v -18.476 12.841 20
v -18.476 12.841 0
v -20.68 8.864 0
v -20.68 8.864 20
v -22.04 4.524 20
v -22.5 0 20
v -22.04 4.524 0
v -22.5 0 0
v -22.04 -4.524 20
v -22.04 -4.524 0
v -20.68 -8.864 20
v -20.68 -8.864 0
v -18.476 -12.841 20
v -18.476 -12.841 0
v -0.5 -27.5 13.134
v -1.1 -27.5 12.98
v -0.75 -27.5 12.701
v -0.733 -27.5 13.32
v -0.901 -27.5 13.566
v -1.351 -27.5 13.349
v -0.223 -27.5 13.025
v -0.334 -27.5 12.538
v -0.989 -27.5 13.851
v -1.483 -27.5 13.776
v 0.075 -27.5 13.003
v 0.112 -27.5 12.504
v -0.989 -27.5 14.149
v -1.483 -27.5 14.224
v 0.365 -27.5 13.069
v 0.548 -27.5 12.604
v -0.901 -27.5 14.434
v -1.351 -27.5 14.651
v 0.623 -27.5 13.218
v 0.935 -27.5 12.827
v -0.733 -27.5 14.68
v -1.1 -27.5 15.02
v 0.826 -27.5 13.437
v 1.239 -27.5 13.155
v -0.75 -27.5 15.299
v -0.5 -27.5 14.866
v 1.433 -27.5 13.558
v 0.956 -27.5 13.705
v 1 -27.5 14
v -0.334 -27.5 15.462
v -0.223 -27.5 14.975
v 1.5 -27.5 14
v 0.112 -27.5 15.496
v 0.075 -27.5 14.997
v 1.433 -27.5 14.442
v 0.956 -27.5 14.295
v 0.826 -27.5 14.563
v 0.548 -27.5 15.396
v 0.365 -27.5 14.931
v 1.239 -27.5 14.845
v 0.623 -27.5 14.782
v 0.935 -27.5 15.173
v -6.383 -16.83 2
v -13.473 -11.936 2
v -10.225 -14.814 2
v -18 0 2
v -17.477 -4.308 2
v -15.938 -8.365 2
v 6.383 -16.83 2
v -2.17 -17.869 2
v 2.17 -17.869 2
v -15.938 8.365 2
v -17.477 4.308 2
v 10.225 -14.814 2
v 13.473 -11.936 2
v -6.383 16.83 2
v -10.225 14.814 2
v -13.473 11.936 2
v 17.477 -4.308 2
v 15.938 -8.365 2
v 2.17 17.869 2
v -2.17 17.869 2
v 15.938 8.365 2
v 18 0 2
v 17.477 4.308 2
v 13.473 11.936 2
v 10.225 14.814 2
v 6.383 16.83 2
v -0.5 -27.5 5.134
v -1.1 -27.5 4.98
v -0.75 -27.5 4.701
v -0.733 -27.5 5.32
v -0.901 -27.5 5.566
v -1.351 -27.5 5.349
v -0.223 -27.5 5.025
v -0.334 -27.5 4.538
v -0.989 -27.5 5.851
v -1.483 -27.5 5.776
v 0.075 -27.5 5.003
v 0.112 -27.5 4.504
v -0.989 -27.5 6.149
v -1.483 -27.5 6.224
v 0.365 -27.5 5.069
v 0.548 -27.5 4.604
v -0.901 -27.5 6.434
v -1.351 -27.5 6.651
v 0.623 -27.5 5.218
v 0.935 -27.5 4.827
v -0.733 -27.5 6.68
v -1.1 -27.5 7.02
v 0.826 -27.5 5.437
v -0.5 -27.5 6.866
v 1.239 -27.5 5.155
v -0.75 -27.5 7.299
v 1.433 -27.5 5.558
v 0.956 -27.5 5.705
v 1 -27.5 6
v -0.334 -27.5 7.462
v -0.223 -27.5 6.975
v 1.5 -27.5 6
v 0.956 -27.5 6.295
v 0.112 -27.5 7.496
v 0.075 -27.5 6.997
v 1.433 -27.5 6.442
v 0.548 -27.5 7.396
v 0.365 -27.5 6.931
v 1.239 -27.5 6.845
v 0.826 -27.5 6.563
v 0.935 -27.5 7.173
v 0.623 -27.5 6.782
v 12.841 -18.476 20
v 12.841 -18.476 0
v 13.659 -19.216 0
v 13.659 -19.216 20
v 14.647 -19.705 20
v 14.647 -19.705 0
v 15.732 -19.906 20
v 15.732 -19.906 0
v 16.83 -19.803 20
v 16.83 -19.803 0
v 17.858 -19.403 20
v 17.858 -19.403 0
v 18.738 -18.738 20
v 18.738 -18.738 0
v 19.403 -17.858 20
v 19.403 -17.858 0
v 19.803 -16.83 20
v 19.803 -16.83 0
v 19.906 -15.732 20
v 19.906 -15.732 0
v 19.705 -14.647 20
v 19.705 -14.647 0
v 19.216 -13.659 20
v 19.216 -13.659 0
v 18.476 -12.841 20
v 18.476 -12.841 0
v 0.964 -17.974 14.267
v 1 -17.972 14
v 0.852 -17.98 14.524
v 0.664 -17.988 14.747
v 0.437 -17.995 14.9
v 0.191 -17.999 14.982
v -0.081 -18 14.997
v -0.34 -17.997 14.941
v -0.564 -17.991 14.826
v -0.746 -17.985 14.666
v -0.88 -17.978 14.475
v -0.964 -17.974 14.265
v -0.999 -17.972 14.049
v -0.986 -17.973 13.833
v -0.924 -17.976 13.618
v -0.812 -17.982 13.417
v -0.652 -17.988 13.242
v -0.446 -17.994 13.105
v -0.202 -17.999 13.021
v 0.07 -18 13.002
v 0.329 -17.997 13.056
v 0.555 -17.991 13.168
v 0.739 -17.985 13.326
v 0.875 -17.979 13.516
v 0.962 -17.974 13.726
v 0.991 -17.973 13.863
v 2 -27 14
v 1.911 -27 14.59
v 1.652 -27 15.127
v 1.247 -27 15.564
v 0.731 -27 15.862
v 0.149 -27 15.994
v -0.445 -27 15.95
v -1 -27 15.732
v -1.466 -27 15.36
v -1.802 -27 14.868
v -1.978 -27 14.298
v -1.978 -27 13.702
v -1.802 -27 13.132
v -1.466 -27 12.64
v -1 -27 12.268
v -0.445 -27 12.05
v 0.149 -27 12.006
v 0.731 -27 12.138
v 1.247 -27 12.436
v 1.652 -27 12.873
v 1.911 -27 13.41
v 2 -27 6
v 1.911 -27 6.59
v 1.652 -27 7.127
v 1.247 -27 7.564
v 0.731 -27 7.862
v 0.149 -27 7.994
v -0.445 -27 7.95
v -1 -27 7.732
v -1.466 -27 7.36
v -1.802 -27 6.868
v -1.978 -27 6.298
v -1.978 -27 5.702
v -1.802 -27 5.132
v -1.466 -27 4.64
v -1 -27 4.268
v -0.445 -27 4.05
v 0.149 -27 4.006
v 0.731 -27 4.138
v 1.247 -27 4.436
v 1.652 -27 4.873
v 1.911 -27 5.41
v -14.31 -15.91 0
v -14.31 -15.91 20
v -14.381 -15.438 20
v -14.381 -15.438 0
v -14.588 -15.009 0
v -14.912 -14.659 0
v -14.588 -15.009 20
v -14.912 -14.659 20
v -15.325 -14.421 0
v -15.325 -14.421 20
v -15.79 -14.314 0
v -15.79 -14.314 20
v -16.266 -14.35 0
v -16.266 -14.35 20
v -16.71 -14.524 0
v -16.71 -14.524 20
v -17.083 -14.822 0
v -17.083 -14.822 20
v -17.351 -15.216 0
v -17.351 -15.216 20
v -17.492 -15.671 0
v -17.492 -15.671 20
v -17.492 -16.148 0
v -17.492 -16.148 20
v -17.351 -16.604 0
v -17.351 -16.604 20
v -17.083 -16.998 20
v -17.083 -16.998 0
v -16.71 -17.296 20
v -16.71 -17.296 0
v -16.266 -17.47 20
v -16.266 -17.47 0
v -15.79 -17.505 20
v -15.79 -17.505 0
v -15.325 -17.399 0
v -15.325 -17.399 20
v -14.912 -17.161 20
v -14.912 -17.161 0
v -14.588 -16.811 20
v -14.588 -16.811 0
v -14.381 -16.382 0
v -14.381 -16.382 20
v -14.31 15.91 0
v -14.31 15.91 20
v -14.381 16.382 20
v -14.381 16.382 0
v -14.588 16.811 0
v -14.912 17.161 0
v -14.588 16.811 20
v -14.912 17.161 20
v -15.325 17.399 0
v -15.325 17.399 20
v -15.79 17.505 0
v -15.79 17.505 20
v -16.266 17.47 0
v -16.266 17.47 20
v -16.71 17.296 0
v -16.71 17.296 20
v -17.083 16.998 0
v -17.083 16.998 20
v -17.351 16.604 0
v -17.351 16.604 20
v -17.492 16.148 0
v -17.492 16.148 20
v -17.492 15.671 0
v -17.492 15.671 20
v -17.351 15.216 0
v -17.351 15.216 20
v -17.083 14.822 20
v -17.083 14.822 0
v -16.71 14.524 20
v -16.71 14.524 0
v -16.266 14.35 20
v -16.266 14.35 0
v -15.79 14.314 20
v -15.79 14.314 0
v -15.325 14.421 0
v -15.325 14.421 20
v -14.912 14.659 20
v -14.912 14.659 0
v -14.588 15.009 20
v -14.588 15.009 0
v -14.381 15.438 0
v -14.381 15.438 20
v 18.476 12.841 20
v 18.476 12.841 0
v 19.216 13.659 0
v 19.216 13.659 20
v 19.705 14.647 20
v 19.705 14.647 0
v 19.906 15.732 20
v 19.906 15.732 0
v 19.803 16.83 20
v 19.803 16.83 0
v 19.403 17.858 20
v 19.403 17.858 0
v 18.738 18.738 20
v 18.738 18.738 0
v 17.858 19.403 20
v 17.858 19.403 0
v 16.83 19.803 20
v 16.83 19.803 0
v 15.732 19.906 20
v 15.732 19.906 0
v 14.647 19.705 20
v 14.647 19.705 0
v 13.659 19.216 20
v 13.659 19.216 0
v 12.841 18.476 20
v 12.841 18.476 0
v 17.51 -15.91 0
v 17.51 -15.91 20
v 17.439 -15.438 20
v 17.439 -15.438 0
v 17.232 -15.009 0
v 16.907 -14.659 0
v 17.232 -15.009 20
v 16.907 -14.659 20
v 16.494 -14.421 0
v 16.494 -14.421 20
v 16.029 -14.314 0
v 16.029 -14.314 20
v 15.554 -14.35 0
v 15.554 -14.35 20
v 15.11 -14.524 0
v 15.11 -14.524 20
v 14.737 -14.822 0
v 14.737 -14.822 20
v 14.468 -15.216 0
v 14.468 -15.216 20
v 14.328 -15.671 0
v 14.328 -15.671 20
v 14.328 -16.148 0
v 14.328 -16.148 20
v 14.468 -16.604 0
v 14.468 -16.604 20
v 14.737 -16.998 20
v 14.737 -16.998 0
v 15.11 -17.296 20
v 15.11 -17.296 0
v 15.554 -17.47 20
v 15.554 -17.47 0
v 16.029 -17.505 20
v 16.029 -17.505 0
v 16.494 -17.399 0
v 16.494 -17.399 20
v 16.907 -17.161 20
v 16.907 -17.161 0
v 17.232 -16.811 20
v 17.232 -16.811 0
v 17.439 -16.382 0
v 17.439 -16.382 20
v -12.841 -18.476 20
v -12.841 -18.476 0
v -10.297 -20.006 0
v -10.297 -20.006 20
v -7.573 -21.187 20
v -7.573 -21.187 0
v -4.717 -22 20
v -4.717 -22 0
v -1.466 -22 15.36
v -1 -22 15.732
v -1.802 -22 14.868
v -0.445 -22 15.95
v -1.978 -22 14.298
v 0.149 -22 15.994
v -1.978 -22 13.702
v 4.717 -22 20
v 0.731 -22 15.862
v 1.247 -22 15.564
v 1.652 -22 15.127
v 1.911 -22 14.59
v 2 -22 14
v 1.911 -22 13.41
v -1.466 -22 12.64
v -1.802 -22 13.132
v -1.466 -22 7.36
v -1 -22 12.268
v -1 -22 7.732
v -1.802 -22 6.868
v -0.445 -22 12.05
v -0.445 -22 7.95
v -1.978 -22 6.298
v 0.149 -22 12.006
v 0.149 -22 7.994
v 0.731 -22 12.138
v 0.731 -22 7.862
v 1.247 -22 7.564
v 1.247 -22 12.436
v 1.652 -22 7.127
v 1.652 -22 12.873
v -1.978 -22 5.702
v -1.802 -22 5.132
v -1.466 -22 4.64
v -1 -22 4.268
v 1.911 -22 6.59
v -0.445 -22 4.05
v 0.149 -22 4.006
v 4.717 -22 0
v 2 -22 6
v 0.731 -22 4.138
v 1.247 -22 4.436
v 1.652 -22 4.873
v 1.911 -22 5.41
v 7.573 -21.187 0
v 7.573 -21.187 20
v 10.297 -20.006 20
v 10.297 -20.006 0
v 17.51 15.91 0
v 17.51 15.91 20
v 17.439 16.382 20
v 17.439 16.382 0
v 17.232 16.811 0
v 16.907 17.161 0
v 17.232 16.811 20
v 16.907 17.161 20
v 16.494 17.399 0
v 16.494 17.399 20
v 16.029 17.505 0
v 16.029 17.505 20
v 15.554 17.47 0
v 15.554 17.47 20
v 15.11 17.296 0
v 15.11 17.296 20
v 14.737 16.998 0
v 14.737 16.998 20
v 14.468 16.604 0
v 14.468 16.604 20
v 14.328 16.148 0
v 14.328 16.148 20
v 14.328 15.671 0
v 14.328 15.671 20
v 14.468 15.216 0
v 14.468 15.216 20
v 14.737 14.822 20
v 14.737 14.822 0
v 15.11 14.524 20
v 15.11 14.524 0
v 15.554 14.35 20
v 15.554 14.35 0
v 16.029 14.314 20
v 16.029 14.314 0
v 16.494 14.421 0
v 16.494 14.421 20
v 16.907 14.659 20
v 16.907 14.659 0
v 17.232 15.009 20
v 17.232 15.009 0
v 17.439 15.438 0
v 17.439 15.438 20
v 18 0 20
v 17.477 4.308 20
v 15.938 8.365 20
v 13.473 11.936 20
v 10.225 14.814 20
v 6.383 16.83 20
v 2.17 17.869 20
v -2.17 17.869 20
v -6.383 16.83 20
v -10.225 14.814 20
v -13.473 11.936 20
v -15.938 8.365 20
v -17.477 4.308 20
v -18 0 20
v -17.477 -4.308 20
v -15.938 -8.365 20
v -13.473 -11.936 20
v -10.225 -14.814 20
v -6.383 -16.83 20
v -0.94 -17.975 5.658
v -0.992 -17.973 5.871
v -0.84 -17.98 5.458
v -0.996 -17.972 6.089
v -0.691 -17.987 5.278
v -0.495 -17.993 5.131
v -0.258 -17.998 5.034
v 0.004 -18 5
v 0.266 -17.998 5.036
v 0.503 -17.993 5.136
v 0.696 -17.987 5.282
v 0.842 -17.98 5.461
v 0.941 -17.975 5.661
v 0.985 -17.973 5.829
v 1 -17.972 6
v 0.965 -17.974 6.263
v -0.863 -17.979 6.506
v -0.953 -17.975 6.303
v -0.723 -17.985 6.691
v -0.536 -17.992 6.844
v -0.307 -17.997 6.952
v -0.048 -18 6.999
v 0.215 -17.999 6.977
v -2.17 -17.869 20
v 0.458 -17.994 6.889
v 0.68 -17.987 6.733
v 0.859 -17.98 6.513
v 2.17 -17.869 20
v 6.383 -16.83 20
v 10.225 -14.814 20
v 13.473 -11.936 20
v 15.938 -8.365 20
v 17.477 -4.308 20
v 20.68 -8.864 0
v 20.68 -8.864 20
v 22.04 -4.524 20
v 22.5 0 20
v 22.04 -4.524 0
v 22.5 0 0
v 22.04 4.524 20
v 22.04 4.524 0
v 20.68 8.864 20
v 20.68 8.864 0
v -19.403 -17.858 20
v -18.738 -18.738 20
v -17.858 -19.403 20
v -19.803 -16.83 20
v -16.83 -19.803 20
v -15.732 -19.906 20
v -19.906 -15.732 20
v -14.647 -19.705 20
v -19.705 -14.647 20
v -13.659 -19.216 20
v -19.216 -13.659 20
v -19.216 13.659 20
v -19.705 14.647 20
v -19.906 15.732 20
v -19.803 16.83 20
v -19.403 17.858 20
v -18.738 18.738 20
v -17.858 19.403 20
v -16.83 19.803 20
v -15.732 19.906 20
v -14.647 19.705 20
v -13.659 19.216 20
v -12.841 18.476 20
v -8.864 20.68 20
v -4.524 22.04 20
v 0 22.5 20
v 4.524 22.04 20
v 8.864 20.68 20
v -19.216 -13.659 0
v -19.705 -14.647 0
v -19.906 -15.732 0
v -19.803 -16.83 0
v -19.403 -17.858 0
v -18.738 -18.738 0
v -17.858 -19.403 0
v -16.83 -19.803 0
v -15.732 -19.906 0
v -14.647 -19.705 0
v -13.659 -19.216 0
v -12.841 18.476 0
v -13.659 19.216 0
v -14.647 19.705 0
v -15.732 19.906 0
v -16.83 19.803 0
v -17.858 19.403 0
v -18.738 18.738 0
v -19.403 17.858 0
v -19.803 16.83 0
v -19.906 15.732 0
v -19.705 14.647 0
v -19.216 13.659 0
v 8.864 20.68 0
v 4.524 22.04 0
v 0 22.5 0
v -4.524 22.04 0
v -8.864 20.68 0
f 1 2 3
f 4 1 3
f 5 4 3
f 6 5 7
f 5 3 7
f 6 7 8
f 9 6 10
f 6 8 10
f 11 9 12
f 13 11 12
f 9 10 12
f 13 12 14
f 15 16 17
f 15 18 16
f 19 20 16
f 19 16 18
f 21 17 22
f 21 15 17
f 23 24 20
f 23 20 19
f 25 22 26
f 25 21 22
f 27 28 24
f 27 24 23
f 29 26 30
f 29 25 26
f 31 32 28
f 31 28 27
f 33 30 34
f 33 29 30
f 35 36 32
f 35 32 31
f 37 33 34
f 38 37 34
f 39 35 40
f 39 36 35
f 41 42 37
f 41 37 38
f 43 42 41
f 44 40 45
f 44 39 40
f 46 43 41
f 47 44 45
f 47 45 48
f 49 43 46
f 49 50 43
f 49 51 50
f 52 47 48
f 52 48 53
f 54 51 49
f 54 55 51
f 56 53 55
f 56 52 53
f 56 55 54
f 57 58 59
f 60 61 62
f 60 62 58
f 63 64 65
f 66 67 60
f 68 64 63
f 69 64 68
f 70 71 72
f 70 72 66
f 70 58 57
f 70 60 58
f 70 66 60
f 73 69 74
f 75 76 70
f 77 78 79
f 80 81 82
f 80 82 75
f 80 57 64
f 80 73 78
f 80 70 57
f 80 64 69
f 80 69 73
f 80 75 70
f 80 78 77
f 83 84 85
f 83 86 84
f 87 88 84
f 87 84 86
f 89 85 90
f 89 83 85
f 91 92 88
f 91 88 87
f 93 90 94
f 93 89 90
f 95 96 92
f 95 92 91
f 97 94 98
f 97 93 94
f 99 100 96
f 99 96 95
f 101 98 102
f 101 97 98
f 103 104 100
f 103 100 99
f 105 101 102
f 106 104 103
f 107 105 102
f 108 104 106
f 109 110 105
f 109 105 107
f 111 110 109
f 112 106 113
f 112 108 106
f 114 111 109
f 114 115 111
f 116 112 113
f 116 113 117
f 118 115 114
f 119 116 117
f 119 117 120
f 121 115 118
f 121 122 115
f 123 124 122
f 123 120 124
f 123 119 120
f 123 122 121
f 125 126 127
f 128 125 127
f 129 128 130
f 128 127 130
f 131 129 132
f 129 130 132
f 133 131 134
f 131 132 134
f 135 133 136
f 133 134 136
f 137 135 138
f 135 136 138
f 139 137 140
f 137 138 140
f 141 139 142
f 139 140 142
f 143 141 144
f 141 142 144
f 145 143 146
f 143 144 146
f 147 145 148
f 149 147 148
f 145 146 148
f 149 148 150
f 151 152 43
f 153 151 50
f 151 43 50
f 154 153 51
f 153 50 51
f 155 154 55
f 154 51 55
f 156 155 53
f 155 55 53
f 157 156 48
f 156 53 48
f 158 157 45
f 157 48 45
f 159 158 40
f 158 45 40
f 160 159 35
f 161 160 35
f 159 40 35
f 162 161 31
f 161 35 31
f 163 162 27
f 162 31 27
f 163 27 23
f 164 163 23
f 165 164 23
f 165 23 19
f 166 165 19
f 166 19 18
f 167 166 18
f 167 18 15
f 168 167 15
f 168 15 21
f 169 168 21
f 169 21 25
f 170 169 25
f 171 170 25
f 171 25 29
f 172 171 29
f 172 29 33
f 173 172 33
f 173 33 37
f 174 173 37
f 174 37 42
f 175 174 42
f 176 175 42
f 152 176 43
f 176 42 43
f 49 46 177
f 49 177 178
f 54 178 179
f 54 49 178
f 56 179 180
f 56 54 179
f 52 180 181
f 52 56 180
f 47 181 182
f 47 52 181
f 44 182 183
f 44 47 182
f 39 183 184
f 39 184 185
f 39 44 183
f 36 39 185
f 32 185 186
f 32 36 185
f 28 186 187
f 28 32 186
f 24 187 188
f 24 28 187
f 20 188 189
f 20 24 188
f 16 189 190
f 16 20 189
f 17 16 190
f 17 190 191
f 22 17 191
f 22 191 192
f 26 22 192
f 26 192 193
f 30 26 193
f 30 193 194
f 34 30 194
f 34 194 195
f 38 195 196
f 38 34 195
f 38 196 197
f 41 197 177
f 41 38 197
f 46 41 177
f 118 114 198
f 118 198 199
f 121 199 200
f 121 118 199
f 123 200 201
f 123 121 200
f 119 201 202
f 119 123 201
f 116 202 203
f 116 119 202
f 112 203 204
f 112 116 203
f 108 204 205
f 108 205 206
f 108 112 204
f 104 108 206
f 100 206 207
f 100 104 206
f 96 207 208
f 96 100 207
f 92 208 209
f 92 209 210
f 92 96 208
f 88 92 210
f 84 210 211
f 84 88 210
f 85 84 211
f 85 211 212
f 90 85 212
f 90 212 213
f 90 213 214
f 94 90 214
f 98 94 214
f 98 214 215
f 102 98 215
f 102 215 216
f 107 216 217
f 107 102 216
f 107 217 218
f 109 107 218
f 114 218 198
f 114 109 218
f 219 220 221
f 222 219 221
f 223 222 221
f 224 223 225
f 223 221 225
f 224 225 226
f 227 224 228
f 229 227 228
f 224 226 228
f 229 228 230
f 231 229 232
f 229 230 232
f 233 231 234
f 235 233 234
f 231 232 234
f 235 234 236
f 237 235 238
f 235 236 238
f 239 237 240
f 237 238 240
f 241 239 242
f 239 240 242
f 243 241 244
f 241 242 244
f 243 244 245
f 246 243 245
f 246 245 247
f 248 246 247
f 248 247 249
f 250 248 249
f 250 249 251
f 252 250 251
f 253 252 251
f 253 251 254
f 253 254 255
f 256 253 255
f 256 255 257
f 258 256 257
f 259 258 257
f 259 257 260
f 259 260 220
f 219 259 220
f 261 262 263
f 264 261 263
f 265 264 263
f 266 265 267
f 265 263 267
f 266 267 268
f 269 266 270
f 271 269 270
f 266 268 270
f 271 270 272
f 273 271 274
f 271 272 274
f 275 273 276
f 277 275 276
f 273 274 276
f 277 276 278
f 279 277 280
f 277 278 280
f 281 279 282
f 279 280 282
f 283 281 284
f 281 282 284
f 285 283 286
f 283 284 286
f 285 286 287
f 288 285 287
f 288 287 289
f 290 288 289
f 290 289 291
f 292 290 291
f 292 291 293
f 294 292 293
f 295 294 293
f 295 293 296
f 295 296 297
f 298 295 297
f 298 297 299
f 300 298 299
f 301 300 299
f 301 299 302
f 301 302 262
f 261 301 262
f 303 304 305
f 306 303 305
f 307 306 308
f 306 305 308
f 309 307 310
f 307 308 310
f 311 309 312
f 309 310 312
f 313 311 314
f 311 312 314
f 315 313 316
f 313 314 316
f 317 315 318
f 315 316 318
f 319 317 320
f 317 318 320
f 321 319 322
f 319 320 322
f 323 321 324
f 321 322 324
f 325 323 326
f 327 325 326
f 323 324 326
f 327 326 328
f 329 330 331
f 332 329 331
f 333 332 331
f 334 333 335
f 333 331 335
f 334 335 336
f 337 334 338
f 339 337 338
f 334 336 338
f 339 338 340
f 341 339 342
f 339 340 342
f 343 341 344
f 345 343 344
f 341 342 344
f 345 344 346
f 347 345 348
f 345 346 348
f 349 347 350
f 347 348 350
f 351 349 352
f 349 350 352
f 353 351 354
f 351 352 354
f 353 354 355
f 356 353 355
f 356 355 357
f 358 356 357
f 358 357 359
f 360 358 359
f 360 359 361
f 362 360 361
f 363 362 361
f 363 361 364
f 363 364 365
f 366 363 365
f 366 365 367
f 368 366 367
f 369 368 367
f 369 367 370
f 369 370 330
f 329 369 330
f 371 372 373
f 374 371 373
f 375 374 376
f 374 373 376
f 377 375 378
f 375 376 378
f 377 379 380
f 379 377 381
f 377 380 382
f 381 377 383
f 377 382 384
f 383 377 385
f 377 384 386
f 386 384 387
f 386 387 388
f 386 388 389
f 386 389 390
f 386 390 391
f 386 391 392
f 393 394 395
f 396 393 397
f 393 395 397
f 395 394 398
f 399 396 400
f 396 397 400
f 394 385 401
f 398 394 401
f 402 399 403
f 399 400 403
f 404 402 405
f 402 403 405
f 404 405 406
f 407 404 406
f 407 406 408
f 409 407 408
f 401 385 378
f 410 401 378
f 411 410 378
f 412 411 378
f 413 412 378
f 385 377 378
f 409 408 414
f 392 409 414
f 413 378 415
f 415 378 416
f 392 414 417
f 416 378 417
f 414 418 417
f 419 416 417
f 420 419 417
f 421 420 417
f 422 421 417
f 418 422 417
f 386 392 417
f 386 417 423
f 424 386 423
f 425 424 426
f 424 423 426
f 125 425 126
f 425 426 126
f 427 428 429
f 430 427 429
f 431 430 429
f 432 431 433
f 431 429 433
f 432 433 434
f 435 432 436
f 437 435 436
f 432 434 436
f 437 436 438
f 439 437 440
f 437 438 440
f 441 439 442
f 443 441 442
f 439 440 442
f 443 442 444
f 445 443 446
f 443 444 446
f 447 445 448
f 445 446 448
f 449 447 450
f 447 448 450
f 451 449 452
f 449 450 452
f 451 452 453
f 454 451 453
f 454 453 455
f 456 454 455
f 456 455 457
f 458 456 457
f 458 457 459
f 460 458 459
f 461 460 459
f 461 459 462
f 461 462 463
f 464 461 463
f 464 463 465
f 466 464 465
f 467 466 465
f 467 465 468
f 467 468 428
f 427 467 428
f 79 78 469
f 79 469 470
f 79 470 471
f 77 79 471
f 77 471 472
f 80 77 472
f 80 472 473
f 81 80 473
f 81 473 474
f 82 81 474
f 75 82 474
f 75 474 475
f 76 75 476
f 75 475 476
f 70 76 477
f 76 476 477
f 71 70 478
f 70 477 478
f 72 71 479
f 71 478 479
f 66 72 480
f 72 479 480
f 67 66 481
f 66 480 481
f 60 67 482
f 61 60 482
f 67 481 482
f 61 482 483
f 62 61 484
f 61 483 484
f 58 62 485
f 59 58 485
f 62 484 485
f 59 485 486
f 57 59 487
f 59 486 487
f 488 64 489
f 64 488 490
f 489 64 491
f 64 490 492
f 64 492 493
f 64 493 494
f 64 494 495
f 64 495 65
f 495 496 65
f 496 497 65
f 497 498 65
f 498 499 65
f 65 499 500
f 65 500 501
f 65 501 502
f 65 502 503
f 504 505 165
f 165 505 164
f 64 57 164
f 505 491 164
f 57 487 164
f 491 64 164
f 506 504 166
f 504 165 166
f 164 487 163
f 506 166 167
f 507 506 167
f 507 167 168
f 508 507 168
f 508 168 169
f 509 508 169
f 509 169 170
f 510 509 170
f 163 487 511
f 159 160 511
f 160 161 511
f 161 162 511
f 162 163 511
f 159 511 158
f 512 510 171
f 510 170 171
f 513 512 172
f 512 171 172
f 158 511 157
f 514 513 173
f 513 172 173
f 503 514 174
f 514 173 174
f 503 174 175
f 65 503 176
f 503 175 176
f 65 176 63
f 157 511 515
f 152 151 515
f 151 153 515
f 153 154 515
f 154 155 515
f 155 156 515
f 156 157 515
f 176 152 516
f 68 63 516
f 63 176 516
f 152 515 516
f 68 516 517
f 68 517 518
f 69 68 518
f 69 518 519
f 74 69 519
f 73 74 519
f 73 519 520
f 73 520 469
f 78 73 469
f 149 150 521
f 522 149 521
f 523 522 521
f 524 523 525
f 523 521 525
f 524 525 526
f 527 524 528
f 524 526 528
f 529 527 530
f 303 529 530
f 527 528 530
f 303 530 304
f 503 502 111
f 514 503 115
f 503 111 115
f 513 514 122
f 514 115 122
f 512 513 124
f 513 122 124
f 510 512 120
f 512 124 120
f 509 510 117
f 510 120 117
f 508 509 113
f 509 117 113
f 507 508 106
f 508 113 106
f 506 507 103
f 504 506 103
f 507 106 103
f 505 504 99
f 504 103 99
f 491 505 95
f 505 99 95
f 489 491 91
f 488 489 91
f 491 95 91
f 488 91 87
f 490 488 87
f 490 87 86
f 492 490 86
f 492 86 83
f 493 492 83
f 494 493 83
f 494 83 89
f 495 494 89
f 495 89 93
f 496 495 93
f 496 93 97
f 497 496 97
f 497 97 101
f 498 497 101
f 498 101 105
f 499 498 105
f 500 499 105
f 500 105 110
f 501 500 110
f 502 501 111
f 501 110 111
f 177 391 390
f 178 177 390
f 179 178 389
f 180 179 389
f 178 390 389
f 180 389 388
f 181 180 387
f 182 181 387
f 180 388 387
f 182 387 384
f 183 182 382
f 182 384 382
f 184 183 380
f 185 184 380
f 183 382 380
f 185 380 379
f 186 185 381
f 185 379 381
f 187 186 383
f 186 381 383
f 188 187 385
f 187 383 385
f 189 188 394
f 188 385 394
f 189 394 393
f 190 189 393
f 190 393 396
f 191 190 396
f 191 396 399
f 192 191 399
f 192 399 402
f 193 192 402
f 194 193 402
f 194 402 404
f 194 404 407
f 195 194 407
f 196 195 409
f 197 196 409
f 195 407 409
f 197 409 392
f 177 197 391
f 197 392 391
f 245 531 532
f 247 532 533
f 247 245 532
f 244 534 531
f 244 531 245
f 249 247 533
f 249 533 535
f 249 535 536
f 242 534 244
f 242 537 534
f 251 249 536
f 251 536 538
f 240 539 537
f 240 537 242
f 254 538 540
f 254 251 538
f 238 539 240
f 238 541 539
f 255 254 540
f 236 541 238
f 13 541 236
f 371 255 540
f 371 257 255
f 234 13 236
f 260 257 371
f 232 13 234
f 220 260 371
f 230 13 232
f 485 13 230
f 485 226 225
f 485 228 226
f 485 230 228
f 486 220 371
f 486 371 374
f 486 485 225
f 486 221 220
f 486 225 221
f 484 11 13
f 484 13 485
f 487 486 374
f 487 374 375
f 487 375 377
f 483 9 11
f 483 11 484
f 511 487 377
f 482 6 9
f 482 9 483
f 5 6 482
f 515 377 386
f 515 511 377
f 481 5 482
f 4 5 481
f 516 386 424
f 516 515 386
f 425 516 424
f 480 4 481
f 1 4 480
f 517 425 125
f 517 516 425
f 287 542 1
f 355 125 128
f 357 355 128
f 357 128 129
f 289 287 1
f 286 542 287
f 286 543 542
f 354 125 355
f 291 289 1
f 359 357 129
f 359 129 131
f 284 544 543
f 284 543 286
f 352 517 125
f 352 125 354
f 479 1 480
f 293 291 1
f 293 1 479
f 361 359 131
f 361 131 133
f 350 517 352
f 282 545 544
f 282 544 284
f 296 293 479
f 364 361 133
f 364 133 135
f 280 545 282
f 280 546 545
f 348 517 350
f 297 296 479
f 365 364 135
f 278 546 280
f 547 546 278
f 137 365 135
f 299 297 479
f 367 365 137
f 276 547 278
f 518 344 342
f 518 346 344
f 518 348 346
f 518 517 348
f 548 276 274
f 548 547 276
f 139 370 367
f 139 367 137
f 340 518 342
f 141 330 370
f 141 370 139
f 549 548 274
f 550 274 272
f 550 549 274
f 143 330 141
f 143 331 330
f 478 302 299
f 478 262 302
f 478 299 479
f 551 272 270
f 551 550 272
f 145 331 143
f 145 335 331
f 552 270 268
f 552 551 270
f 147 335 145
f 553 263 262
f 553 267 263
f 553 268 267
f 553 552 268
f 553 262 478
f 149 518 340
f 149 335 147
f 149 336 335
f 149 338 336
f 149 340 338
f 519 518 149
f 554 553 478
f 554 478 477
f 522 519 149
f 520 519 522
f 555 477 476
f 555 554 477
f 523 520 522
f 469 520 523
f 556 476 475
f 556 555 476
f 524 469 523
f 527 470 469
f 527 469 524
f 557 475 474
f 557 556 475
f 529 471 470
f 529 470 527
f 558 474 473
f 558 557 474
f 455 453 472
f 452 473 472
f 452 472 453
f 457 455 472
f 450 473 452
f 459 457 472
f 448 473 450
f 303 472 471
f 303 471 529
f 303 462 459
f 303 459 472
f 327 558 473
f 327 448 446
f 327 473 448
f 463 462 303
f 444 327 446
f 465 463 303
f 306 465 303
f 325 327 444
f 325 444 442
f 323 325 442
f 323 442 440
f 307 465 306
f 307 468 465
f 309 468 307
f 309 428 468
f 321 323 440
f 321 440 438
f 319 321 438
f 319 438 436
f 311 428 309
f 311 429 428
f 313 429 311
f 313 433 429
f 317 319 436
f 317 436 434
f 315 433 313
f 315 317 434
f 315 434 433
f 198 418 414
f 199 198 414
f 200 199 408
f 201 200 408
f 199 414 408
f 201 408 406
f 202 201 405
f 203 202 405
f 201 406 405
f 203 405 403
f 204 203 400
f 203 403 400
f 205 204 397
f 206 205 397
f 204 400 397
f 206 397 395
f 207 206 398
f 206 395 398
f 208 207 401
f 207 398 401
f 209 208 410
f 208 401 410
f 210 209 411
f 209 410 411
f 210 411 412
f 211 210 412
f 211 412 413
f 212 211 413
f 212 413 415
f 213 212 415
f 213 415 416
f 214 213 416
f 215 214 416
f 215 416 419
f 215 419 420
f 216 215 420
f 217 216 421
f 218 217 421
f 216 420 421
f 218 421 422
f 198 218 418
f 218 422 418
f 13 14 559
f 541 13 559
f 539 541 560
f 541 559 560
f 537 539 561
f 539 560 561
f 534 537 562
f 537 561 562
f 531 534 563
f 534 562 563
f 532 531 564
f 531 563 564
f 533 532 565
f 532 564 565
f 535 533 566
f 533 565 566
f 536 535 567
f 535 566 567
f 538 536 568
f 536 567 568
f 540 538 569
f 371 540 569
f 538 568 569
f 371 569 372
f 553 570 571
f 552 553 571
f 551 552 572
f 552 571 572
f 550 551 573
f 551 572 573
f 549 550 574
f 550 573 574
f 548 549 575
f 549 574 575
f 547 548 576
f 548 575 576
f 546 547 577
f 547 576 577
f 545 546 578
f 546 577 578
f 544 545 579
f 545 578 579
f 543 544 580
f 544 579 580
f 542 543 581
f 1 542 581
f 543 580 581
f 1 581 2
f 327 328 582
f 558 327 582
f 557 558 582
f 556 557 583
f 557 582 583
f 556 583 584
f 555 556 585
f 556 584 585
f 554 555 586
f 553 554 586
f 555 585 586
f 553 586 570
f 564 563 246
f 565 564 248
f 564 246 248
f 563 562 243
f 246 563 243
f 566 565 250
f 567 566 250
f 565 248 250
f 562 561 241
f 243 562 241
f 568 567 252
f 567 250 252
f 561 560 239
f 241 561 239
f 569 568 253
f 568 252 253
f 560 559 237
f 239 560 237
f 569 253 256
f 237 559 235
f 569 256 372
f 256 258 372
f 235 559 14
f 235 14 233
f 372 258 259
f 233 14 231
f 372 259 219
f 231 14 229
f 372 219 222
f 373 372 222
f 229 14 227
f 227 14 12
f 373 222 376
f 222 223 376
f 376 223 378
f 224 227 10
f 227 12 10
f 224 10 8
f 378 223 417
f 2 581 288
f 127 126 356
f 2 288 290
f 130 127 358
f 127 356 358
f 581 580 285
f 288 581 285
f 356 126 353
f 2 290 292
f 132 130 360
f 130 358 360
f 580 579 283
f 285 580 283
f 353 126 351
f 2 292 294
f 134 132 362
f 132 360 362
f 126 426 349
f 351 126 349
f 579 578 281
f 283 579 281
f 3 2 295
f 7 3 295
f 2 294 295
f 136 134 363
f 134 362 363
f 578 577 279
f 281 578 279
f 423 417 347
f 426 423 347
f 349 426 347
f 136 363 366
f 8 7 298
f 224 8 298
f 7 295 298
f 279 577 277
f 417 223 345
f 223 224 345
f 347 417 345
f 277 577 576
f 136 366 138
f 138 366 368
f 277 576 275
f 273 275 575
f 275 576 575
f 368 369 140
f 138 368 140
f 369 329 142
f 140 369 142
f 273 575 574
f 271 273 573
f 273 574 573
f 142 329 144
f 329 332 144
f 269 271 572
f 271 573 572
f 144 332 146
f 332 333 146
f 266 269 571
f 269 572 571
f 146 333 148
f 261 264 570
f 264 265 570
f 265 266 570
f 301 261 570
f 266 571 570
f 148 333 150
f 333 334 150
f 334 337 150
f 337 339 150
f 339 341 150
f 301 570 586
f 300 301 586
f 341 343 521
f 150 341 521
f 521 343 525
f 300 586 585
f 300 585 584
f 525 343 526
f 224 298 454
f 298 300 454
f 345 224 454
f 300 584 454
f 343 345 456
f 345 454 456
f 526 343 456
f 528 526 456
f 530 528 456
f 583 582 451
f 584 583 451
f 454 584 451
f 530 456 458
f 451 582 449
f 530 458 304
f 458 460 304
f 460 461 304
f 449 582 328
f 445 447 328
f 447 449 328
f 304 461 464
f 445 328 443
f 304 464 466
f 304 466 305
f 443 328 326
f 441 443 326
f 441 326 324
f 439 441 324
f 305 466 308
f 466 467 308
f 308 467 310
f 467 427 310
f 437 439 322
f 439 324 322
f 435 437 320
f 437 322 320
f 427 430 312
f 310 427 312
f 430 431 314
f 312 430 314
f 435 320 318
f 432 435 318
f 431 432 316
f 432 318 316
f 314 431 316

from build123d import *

# Parameters (mm, degrees)
F1_DEPTH  = 20
F2_R      = 1.6
F3_DEPTH  = 20.001
F4_R      = 18
F5_DEPTH  = 18
F6_R      = 2
F7_DEPTH  = 5.5
F9_R      = 1
F10_DEPTH = 25
F11_R     = 1
F12_DEPTH = 25
F13_SIZE  = 0.5


with BuildPart() as f1:
    # F0 (on Top) → F1 (new body)
    with BuildSketch(Plane.XY):
        with BuildLine():
            ThreePointArc((18.475718, 12.841256), (18.73833, 18.73833), (12.841256, 18.475718))
            ThreePointArc((12.841256, 18.475718), (0, 22.5), (-12.841256, 18.475718))
            ThreePointArc((-12.841256, 18.475718), (-18.73833, 18.73833), (-18.475718, 12.841256))
            ThreePointArc((-18.475718, 12.841256), (-22.5, 0), (-18.475718, -12.841256))
            ThreePointArc((-18.475718, -12.841256), (-18.73833, -18.73833), (-12.841256, -18.475718))
            ThreePointArc((-12.841256, -18.475718), (-8.954225, -20.641508), (-4.716991, -22))
            Line((-4.716991, -22), (4.716991, -22))
            ThreePointArc((4.716991, -22), (8.954225, -20.641508), (12.841256, -18.475718))
            ThreePointArc((12.841256, -18.475718), (18.73833, -18.73833), (18.475718, -12.841256))
            ThreePointArc((18.475718, -12.841256), (22.5, 0), (18.475718, 12.841256))
        make_face()
    extrude(amount=F1_DEPTH)

    # F2 (on face) → F3 (cut, through all)
    with BuildSketch(Plane.XY.offset(20)):
        with Locations((-15.909903, 15.909903)):
            Circle(F2_R)
        with Locations((15.909903, 15.909903)):
            Circle(F2_R)
        with Locations((15.909903, -15.909903)):
            Circle(F2_R)
        with Locations((-15.909903, -15.909903)):
            Circle(F2_R)
    extrude(amount=-F3_DEPTH, mode=Mode.SUBTRACT)

    # F4 (on face) → F5 (cut)
    with BuildSketch(Plane.XY.offset(20)):
        Circle(F4_R)
    extrude(amount=-F5_DEPTH, mode=Mode.SUBTRACT)

    # F6 (on face) → F7 (join)
    with BuildSketch(Plane.XZ.offset(22)):
        with Locations((0, 14)):
            Circle(F6_R)
        with Locations((0, 6)):
            Circle(F6_R)
    extrude(amount=F7_DEPTH)

    # F9 (on face) → F10 (cut)
    with BuildSketch(Plane.XZ.offset(27.5)):
        with Locations((0, 6)):
            Circle(F9_R)
    extrude(amount=-F10_DEPTH, mode=Mode.SUBTRACT)

    # F11 (on face) → F12 (cut)
    with BuildSketch(Plane.XZ.offset(27.5)):
        with Locations((0, 14)):
            Circle(F11_R)
    extrude(amount=-F12_DEPTH, mode=Mode.SUBTRACT)

    # F13
    f13_edges = [f1.edges().sort_by_distance(p)[0] for p in [
        (-2, -27.5, 14),
        (-2, -27.5, 6),
    ]]
    chamfer(f13_edges, length=F13_SIZE)


solid = f1.part
